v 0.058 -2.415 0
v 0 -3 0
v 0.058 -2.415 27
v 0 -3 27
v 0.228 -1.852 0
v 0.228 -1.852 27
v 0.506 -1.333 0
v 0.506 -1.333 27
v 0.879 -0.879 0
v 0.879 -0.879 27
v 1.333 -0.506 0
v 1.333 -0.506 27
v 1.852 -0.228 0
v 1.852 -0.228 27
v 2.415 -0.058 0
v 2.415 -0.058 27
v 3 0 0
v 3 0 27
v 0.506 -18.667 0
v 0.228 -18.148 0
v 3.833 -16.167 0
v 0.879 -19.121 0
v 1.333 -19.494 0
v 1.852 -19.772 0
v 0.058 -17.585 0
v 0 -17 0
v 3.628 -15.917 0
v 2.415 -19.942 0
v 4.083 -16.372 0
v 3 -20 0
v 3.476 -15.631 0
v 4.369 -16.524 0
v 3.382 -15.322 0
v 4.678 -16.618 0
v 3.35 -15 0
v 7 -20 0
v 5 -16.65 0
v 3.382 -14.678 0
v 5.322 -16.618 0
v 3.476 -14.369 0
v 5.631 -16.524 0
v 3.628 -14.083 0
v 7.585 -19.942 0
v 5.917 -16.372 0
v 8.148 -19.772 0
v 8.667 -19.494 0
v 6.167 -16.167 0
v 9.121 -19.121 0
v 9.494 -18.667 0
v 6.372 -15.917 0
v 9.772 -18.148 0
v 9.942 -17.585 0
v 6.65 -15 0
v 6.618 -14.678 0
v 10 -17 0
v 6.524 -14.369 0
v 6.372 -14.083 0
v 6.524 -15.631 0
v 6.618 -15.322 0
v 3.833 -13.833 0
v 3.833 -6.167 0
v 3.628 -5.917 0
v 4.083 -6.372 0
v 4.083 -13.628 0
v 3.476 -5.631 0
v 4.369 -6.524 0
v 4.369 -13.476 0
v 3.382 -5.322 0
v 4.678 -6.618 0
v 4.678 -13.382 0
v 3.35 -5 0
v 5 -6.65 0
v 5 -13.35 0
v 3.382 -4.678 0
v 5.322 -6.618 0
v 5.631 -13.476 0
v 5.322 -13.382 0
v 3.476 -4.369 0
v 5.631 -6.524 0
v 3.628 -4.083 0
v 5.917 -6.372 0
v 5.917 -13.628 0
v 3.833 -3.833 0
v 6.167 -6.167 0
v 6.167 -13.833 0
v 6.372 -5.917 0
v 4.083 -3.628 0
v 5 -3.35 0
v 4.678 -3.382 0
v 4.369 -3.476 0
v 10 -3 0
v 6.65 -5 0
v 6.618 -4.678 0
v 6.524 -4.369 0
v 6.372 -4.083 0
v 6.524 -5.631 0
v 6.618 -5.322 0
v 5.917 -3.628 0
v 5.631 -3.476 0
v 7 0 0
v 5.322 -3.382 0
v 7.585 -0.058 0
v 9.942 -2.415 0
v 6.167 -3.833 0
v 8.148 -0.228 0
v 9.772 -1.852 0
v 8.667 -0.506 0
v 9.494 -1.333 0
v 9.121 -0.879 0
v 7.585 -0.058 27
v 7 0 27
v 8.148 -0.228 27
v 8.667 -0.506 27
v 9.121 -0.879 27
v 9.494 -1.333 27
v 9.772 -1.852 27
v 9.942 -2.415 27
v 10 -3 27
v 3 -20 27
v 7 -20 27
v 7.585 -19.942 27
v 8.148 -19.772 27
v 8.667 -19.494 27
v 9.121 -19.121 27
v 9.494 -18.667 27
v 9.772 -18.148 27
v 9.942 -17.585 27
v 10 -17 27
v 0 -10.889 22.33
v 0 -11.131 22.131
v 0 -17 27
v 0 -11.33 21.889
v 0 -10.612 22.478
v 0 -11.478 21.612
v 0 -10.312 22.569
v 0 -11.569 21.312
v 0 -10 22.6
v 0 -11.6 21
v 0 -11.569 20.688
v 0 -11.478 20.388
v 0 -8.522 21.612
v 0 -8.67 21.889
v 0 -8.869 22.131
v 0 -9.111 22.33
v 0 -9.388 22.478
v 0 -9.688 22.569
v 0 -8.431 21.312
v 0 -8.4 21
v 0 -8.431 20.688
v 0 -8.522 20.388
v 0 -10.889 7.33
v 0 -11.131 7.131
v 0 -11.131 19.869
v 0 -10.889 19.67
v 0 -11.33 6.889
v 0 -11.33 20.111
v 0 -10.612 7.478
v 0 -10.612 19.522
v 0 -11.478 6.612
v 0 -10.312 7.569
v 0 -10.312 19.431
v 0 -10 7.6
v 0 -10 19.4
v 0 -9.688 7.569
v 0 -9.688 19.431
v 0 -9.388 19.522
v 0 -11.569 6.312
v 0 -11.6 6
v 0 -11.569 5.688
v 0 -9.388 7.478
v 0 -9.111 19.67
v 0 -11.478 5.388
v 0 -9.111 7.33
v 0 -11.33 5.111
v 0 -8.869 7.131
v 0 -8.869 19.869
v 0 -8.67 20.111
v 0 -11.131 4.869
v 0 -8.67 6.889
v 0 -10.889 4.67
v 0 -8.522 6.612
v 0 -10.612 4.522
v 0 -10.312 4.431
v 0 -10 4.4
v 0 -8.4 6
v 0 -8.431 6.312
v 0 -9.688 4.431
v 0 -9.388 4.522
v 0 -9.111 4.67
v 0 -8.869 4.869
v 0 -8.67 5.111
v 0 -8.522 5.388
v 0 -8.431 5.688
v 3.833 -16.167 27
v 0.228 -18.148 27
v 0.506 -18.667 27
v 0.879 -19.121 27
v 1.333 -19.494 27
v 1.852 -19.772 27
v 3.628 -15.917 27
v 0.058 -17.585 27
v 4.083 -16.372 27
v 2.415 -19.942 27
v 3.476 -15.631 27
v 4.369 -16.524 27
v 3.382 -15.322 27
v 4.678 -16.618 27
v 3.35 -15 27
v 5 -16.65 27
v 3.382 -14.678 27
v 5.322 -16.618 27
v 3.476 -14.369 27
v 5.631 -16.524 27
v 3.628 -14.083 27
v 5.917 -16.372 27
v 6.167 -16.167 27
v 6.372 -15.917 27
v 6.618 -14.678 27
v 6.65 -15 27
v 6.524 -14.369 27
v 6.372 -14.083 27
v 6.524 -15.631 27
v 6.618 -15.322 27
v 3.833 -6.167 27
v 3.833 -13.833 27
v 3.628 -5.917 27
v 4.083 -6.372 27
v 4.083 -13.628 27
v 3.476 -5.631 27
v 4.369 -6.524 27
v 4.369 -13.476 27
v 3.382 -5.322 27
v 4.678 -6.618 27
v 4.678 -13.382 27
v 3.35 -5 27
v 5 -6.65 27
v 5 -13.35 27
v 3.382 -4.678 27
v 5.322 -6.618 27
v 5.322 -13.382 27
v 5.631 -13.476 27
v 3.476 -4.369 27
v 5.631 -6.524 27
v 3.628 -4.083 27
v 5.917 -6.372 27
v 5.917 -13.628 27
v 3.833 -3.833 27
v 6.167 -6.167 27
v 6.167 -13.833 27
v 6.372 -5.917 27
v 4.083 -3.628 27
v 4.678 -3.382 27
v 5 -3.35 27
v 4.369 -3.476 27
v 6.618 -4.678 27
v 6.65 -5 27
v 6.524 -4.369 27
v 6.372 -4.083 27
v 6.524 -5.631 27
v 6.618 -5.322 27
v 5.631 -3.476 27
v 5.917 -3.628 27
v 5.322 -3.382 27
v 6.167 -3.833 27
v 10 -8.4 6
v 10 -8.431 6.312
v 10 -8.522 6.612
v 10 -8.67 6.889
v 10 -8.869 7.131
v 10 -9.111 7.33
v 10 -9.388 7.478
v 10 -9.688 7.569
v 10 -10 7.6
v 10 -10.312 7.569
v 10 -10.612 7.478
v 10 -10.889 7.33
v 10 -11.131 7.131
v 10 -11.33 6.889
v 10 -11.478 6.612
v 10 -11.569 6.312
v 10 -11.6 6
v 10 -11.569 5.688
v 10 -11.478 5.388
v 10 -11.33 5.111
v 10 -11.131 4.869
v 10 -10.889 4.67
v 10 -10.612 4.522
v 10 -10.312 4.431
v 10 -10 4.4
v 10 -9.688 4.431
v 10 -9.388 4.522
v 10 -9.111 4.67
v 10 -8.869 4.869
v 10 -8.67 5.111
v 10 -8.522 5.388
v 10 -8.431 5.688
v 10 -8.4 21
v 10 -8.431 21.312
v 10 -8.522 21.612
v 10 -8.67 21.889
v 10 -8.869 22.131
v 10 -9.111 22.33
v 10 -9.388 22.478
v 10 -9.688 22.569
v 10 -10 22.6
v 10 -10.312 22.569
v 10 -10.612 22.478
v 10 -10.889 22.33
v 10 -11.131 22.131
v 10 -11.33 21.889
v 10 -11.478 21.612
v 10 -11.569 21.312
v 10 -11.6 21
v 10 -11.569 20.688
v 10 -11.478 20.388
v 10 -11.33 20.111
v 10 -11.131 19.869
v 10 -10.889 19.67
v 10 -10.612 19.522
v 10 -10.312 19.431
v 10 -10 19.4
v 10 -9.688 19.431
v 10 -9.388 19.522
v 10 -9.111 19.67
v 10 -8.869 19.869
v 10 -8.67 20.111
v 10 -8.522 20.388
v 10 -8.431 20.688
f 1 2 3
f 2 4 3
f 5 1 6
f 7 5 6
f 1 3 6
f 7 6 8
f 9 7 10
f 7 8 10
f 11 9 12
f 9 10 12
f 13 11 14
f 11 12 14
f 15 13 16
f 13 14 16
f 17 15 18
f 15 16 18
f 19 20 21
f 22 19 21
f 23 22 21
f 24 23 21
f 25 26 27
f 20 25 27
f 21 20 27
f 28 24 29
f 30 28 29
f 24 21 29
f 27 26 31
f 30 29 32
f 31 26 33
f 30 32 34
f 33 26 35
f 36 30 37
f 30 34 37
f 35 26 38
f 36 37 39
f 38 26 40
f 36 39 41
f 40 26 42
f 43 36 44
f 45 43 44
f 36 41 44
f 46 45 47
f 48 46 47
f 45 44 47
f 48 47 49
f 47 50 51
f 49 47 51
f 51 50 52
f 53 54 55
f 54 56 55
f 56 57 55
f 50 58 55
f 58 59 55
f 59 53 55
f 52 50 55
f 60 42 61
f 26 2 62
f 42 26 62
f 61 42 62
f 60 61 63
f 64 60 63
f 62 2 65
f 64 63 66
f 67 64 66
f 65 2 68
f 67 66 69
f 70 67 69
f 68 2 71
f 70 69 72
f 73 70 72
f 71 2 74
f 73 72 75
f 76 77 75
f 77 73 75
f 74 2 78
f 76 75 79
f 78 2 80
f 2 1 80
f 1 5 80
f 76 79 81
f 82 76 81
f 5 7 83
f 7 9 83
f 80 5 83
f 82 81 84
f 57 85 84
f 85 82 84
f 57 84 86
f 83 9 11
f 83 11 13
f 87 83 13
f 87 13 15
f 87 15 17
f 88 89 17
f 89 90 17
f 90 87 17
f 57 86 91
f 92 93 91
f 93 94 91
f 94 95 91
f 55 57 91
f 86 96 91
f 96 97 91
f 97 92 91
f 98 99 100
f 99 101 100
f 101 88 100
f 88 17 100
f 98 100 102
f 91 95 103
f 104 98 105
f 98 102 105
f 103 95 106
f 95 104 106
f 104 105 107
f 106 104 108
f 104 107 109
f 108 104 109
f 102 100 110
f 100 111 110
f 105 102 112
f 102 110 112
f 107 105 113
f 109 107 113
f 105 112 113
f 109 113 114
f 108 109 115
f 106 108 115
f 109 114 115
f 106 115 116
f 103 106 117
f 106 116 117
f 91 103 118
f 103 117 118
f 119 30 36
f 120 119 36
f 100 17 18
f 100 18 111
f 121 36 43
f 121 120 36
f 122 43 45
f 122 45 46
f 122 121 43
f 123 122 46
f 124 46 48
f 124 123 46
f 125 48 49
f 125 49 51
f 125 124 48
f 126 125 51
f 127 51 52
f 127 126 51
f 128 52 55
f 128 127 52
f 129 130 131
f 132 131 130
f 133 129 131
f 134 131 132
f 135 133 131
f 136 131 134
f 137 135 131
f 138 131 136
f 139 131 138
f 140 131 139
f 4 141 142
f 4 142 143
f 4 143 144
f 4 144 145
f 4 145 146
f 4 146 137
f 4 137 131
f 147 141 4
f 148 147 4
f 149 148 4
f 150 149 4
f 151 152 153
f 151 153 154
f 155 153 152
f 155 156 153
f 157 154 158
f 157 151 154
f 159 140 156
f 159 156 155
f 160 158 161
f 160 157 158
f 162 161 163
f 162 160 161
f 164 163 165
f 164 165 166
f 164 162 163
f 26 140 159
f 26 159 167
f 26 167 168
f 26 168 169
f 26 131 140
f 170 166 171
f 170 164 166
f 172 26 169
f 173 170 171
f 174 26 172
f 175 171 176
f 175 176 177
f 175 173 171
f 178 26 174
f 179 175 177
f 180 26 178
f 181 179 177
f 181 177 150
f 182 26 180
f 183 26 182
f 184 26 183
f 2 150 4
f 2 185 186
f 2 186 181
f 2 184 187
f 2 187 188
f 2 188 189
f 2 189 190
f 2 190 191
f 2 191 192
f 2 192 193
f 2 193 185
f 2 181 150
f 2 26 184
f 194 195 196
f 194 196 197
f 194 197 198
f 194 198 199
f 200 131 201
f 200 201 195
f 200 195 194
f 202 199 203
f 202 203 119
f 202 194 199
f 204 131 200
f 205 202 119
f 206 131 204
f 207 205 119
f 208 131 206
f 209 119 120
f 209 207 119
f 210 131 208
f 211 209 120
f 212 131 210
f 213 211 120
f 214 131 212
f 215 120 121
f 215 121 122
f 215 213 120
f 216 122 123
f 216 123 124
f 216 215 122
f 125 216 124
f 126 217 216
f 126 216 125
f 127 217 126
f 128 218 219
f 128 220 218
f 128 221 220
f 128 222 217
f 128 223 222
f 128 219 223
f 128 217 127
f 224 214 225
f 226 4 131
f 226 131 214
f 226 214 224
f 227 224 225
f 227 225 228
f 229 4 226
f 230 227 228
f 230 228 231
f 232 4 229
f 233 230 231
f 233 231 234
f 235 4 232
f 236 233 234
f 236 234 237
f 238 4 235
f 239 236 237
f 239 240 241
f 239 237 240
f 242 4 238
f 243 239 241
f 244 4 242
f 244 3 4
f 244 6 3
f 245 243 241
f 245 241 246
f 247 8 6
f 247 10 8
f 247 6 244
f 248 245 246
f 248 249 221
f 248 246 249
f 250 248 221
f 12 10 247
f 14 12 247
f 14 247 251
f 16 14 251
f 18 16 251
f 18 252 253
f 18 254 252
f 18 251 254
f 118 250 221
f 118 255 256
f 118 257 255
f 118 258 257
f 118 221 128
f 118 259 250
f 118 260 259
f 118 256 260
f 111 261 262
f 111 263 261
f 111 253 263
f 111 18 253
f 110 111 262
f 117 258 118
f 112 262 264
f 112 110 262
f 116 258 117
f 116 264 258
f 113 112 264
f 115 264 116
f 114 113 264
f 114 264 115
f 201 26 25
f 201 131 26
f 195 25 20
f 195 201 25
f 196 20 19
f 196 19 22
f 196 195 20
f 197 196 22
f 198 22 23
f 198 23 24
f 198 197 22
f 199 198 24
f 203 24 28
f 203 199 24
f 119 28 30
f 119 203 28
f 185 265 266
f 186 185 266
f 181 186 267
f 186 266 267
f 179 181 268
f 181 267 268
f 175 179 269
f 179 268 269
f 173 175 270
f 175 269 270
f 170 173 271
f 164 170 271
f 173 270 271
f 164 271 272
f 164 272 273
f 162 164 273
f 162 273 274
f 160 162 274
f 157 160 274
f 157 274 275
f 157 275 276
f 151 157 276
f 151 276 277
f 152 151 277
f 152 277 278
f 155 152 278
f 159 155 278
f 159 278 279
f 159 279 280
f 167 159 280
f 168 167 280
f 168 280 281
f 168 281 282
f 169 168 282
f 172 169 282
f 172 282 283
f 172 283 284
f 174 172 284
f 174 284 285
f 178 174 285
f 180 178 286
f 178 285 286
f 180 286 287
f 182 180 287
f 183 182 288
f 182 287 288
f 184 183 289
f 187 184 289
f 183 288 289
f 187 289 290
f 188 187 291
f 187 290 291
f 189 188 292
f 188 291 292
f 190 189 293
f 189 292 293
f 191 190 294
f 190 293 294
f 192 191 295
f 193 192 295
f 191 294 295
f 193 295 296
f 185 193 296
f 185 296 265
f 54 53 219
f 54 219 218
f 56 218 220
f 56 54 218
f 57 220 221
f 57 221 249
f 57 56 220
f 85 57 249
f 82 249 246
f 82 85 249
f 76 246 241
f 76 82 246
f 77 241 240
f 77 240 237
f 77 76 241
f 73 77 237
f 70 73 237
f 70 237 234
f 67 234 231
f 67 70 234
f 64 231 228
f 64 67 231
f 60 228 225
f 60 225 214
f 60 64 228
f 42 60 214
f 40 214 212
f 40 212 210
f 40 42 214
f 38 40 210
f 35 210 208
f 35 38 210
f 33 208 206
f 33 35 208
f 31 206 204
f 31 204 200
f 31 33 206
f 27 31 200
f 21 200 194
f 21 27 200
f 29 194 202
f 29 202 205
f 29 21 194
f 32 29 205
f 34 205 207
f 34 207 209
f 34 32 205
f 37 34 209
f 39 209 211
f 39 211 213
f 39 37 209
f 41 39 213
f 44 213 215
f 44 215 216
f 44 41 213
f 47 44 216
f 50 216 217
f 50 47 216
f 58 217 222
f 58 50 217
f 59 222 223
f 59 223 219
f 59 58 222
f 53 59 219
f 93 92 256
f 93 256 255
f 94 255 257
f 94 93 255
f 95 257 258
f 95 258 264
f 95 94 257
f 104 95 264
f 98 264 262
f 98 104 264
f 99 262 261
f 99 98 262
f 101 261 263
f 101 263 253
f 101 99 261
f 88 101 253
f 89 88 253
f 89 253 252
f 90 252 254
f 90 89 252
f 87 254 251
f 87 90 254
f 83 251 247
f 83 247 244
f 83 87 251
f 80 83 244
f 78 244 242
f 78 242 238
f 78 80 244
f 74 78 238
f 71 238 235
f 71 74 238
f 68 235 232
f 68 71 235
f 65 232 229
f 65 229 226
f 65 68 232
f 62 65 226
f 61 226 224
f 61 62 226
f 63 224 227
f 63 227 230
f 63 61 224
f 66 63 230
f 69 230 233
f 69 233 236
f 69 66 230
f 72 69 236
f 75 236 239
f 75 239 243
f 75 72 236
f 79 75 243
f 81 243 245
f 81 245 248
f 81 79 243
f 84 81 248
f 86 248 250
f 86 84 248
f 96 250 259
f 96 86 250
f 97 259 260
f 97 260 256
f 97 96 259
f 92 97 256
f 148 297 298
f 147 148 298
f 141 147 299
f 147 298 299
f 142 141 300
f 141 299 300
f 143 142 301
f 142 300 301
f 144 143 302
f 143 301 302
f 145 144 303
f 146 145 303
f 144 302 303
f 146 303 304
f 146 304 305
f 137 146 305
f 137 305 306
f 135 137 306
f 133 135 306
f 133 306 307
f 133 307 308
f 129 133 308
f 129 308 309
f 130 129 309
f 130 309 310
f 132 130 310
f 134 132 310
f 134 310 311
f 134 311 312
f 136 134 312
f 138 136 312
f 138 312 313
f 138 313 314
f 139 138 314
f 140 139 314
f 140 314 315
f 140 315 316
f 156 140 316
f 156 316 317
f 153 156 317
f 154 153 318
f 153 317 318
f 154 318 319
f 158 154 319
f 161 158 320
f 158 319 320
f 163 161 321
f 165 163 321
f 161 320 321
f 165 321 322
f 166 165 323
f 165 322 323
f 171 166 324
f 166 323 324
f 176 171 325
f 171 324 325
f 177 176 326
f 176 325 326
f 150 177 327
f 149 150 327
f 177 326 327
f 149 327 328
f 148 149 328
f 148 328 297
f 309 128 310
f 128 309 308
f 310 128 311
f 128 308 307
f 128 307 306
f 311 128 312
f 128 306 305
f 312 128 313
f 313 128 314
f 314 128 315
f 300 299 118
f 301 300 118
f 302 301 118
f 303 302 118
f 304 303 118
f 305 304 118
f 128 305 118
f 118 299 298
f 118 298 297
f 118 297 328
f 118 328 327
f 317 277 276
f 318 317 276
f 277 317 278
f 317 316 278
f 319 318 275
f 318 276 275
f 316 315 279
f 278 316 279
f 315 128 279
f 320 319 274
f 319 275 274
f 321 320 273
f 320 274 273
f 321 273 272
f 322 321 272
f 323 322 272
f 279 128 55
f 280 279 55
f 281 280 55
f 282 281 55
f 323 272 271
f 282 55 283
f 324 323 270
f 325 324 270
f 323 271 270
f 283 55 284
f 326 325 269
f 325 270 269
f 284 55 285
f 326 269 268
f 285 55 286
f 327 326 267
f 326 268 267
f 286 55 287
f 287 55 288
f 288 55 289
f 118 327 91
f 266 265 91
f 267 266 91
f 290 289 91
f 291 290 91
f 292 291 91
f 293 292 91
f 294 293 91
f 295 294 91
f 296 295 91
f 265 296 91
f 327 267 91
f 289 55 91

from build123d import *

# Parameters (mm, degrees)
SKETCH_1_W          = 10
SKETCH_1_H          = 20
SKETCH_1_R          = 1.65
EXTRUDE_1_DEPTH     = 27
FILLET_1_R          = 3
SKETCH_2_R          = 1.6
CUT_EXTRUDE_1_DEPTH = 36.057096286


with BuildPart() as part:
    # 草图1 → 凸台-拉伸1 (new body)
    with BuildSketch(Plane.XY):
        with Locations((5, -10)):
            Rectangle(SKETCH_1_W, SKETCH_1_H)
        with Locations((5, -5)):
            Circle(SKETCH_1_R, mode=Mode.SUBTRACT)
        with Locations((5, -15)):
            Circle(SKETCH_1_R, mode=Mode.SUBTRACT)
    extrude(amount=EXTRUDE_1_DEPTH)

    # 圆角1
    fillet_1_edges = [part.edges().sort_by_distance(p)[0] for p in [
        (0, 0, 13.5),
        (10, 0, 13.5),
        (10, -20, 13.5),
        (0, -20, 13.5),
    ]]
    fillet(fillet_1_edges, radius=FILLET_1_R)

    # 草图2 → 切除-拉伸1 (cut, through all)
    with BuildSketch(Plane(origin=(10, 0, 0), x_dir=(0, 0, -1), z_dir=(1, 0, 0))):
        with Locations(Location((-21, -10, 0), (0, 0, 90))):
            Circle(SKETCH_2_R)
        with Locations(Location((-6, -10, 0), (0, 0, 90))):
            Circle(SKETCH_2_R)
    extrude(amount=-CUT_EXTRUDE_1_DEPTH, mode=Mode.SUBTRACT)


solid = part.part
